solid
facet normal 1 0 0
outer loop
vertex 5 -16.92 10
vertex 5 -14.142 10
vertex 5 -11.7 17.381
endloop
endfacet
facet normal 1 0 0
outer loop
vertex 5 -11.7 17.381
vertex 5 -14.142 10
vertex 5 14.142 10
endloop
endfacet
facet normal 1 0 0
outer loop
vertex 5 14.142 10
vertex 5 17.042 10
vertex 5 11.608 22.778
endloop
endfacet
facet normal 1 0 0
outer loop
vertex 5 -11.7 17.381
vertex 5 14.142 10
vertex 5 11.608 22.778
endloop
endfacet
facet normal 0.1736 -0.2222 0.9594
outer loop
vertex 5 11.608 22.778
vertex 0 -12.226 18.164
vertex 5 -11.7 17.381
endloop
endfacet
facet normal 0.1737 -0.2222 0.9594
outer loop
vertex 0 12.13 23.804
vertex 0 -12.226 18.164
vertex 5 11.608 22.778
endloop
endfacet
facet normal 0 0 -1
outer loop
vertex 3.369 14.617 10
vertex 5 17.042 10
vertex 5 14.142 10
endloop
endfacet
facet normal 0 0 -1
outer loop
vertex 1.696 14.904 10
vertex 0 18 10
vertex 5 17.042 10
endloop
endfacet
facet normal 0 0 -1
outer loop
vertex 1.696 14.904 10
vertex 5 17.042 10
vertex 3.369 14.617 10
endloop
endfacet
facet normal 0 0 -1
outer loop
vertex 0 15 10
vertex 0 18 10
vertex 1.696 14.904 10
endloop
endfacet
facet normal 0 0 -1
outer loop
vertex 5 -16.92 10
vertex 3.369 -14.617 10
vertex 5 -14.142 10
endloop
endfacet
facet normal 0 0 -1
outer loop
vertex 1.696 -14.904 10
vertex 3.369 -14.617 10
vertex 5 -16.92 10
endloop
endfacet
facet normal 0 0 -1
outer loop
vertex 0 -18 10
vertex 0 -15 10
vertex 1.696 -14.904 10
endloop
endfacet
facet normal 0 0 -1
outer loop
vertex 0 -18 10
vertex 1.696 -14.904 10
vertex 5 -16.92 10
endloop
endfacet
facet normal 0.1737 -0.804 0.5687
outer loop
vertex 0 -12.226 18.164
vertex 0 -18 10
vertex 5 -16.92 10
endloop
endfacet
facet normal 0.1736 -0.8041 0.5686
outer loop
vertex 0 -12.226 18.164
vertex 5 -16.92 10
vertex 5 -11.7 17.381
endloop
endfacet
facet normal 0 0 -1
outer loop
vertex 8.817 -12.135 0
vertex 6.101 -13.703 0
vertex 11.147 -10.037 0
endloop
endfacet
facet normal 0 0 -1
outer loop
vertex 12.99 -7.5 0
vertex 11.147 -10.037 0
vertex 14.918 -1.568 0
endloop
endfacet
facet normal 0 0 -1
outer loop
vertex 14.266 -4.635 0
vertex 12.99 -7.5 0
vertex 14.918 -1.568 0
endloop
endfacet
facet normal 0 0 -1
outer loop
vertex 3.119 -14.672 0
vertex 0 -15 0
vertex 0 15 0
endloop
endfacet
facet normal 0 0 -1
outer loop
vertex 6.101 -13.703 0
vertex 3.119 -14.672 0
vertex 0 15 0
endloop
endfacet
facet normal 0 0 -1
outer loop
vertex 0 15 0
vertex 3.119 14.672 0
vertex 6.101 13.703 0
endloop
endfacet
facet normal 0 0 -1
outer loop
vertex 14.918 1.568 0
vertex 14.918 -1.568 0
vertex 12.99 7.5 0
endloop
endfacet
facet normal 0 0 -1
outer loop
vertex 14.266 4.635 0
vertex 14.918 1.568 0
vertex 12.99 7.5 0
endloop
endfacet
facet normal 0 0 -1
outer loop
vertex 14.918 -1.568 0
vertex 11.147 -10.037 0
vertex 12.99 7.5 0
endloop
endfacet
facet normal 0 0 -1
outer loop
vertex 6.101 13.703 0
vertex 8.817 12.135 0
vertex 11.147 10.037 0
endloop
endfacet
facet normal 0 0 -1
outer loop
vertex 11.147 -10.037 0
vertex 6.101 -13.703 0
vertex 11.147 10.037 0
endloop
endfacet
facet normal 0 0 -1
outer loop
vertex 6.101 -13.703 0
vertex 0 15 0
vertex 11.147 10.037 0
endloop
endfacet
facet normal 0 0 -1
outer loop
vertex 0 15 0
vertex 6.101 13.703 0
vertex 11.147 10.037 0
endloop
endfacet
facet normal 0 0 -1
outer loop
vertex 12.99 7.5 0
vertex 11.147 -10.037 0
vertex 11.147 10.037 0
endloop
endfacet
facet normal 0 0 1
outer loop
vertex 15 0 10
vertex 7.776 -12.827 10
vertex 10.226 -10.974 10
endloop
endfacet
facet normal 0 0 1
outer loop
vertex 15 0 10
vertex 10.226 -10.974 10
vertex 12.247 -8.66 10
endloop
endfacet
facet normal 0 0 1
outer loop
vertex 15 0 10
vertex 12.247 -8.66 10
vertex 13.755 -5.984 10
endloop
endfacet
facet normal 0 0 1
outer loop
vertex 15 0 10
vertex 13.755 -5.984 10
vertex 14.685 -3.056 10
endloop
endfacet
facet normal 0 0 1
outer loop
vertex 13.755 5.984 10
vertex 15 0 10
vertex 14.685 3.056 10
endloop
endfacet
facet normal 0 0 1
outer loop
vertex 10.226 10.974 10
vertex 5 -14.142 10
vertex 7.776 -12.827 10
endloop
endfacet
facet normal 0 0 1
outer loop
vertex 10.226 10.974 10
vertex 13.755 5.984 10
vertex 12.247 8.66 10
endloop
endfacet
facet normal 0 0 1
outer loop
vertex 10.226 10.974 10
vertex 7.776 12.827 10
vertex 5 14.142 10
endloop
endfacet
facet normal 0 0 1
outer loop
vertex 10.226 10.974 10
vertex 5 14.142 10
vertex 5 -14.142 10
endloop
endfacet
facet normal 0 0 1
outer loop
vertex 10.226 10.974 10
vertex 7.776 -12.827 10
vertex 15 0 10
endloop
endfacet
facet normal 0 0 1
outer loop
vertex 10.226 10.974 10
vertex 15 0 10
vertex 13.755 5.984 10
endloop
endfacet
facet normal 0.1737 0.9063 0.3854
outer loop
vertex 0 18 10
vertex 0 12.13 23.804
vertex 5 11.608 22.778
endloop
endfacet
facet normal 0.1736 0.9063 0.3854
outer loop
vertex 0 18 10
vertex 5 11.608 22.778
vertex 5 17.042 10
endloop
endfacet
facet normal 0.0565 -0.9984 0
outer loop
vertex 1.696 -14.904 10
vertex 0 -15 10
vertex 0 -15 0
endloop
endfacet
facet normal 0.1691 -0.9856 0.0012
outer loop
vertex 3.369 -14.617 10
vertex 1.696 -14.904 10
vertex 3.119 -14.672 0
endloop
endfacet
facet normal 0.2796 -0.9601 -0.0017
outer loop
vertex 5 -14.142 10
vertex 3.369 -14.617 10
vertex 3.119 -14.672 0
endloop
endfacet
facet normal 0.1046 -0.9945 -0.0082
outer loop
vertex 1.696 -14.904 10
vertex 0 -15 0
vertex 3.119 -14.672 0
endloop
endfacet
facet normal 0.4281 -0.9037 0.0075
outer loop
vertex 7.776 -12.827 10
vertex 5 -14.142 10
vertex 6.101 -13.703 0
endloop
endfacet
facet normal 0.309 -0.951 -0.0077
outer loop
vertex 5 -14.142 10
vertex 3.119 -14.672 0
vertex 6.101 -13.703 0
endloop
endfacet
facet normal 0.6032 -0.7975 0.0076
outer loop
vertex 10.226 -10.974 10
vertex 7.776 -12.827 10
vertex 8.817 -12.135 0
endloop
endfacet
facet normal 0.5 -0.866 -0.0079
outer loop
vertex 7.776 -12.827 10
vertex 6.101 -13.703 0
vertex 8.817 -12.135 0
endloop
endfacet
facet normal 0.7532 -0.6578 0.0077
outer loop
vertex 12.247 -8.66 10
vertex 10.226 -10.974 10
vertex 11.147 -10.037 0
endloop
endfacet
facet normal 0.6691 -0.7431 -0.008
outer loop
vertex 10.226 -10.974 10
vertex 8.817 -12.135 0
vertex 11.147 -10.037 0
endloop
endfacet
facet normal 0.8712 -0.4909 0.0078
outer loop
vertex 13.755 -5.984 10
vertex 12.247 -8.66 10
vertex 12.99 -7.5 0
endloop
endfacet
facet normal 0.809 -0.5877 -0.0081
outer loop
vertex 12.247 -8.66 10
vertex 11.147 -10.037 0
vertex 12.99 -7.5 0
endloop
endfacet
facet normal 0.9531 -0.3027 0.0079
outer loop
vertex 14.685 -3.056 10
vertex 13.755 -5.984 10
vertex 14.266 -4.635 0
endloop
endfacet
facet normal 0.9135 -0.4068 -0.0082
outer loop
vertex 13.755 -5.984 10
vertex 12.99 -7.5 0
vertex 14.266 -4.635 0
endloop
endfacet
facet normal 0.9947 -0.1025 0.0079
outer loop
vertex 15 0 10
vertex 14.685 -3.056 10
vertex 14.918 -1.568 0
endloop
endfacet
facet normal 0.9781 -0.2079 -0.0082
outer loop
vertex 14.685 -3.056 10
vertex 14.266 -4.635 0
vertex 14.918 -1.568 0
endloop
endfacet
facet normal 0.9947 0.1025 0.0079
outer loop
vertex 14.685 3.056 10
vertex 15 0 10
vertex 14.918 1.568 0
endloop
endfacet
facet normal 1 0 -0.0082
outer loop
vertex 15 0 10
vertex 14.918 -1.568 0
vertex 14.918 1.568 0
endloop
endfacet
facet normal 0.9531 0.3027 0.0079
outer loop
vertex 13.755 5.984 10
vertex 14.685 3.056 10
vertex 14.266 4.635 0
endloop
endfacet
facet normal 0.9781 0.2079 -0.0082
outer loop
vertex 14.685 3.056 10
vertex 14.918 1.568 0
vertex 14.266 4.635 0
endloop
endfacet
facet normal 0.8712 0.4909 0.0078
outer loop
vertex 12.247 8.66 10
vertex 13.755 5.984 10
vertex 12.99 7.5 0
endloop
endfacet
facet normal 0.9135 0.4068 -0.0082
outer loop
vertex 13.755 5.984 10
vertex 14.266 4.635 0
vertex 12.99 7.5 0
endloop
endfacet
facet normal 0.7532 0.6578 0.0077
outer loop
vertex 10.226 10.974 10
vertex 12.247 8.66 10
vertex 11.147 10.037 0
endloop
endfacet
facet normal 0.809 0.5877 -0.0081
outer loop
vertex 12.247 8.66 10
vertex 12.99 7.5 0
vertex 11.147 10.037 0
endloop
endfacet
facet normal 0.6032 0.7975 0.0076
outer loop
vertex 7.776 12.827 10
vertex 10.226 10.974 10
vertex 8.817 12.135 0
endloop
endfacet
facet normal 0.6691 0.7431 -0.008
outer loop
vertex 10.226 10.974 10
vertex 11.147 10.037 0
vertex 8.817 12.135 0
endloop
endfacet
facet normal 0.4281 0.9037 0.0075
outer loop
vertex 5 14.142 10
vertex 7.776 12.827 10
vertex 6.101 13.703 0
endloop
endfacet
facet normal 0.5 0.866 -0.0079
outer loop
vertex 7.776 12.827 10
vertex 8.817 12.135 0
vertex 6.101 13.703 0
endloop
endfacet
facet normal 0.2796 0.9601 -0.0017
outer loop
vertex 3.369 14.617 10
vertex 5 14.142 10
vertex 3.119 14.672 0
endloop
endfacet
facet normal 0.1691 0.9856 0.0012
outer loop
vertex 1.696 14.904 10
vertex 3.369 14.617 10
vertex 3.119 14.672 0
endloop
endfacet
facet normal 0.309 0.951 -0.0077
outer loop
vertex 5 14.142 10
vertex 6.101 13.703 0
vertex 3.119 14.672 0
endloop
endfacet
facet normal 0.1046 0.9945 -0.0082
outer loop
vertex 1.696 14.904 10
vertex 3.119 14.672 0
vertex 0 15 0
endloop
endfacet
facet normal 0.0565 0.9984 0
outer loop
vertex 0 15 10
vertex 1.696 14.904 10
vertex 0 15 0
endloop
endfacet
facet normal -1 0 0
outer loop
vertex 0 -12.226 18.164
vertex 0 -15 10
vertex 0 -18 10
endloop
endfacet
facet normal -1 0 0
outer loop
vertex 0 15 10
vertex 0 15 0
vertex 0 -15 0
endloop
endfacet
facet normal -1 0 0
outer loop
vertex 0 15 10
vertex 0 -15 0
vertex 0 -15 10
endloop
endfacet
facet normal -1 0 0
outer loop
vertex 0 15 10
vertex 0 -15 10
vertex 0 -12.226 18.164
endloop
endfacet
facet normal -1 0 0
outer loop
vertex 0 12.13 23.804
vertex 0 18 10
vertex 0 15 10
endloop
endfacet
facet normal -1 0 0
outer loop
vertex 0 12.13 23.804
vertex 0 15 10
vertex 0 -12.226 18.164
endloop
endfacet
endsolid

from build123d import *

# Parameters (mm, degrees)
EXTRUDE1_DEPTH = 10
EXTRUDE2_DEPTH = 5
DRAFT1_ANGLE   = 10


with BuildPart() as part:
    # Sketch1 → Extrude1 (new body)
    with BuildSketch(Plane.XY):
        with BuildLine():
            Line((0, 15), (0, -15))
            ThreePointArc((0, -15), (15, 0), (0, 15))
        make_face()
    extrude(amount=EXTRUDE1_DEPTH)

    # Sketch2 → Extrude2 (add)
    with BuildSketch(Plane(origin=(0, 0, 0), x_dir=(0, 0, -1), z_dir=(1, 0, 0))):
        Polygon((-10, 18), (-10, -18), (-18.164261824, -12.225501851), (-23.803781668, 12.130109739), align=None)
    extrude(amount=EXTRUDE2_DEPTH)

    # Draft1
    draft1_faces = [part.faces().sort_by_distance(p)[0] for p in [
        (2.5, -15.112750925, 14.082130912),
        (2.5, -0.047696056, 20.984021746),
        (2.5, 15.06505487, 16.901890834),
    ]]
    draft(draft1_faces, Plane(origin=(0, 0, 0), x_dir=(0, 0, 1), z_dir=(1, 0, 0)), DRAFT1_ANGLE)


solid = part.part
